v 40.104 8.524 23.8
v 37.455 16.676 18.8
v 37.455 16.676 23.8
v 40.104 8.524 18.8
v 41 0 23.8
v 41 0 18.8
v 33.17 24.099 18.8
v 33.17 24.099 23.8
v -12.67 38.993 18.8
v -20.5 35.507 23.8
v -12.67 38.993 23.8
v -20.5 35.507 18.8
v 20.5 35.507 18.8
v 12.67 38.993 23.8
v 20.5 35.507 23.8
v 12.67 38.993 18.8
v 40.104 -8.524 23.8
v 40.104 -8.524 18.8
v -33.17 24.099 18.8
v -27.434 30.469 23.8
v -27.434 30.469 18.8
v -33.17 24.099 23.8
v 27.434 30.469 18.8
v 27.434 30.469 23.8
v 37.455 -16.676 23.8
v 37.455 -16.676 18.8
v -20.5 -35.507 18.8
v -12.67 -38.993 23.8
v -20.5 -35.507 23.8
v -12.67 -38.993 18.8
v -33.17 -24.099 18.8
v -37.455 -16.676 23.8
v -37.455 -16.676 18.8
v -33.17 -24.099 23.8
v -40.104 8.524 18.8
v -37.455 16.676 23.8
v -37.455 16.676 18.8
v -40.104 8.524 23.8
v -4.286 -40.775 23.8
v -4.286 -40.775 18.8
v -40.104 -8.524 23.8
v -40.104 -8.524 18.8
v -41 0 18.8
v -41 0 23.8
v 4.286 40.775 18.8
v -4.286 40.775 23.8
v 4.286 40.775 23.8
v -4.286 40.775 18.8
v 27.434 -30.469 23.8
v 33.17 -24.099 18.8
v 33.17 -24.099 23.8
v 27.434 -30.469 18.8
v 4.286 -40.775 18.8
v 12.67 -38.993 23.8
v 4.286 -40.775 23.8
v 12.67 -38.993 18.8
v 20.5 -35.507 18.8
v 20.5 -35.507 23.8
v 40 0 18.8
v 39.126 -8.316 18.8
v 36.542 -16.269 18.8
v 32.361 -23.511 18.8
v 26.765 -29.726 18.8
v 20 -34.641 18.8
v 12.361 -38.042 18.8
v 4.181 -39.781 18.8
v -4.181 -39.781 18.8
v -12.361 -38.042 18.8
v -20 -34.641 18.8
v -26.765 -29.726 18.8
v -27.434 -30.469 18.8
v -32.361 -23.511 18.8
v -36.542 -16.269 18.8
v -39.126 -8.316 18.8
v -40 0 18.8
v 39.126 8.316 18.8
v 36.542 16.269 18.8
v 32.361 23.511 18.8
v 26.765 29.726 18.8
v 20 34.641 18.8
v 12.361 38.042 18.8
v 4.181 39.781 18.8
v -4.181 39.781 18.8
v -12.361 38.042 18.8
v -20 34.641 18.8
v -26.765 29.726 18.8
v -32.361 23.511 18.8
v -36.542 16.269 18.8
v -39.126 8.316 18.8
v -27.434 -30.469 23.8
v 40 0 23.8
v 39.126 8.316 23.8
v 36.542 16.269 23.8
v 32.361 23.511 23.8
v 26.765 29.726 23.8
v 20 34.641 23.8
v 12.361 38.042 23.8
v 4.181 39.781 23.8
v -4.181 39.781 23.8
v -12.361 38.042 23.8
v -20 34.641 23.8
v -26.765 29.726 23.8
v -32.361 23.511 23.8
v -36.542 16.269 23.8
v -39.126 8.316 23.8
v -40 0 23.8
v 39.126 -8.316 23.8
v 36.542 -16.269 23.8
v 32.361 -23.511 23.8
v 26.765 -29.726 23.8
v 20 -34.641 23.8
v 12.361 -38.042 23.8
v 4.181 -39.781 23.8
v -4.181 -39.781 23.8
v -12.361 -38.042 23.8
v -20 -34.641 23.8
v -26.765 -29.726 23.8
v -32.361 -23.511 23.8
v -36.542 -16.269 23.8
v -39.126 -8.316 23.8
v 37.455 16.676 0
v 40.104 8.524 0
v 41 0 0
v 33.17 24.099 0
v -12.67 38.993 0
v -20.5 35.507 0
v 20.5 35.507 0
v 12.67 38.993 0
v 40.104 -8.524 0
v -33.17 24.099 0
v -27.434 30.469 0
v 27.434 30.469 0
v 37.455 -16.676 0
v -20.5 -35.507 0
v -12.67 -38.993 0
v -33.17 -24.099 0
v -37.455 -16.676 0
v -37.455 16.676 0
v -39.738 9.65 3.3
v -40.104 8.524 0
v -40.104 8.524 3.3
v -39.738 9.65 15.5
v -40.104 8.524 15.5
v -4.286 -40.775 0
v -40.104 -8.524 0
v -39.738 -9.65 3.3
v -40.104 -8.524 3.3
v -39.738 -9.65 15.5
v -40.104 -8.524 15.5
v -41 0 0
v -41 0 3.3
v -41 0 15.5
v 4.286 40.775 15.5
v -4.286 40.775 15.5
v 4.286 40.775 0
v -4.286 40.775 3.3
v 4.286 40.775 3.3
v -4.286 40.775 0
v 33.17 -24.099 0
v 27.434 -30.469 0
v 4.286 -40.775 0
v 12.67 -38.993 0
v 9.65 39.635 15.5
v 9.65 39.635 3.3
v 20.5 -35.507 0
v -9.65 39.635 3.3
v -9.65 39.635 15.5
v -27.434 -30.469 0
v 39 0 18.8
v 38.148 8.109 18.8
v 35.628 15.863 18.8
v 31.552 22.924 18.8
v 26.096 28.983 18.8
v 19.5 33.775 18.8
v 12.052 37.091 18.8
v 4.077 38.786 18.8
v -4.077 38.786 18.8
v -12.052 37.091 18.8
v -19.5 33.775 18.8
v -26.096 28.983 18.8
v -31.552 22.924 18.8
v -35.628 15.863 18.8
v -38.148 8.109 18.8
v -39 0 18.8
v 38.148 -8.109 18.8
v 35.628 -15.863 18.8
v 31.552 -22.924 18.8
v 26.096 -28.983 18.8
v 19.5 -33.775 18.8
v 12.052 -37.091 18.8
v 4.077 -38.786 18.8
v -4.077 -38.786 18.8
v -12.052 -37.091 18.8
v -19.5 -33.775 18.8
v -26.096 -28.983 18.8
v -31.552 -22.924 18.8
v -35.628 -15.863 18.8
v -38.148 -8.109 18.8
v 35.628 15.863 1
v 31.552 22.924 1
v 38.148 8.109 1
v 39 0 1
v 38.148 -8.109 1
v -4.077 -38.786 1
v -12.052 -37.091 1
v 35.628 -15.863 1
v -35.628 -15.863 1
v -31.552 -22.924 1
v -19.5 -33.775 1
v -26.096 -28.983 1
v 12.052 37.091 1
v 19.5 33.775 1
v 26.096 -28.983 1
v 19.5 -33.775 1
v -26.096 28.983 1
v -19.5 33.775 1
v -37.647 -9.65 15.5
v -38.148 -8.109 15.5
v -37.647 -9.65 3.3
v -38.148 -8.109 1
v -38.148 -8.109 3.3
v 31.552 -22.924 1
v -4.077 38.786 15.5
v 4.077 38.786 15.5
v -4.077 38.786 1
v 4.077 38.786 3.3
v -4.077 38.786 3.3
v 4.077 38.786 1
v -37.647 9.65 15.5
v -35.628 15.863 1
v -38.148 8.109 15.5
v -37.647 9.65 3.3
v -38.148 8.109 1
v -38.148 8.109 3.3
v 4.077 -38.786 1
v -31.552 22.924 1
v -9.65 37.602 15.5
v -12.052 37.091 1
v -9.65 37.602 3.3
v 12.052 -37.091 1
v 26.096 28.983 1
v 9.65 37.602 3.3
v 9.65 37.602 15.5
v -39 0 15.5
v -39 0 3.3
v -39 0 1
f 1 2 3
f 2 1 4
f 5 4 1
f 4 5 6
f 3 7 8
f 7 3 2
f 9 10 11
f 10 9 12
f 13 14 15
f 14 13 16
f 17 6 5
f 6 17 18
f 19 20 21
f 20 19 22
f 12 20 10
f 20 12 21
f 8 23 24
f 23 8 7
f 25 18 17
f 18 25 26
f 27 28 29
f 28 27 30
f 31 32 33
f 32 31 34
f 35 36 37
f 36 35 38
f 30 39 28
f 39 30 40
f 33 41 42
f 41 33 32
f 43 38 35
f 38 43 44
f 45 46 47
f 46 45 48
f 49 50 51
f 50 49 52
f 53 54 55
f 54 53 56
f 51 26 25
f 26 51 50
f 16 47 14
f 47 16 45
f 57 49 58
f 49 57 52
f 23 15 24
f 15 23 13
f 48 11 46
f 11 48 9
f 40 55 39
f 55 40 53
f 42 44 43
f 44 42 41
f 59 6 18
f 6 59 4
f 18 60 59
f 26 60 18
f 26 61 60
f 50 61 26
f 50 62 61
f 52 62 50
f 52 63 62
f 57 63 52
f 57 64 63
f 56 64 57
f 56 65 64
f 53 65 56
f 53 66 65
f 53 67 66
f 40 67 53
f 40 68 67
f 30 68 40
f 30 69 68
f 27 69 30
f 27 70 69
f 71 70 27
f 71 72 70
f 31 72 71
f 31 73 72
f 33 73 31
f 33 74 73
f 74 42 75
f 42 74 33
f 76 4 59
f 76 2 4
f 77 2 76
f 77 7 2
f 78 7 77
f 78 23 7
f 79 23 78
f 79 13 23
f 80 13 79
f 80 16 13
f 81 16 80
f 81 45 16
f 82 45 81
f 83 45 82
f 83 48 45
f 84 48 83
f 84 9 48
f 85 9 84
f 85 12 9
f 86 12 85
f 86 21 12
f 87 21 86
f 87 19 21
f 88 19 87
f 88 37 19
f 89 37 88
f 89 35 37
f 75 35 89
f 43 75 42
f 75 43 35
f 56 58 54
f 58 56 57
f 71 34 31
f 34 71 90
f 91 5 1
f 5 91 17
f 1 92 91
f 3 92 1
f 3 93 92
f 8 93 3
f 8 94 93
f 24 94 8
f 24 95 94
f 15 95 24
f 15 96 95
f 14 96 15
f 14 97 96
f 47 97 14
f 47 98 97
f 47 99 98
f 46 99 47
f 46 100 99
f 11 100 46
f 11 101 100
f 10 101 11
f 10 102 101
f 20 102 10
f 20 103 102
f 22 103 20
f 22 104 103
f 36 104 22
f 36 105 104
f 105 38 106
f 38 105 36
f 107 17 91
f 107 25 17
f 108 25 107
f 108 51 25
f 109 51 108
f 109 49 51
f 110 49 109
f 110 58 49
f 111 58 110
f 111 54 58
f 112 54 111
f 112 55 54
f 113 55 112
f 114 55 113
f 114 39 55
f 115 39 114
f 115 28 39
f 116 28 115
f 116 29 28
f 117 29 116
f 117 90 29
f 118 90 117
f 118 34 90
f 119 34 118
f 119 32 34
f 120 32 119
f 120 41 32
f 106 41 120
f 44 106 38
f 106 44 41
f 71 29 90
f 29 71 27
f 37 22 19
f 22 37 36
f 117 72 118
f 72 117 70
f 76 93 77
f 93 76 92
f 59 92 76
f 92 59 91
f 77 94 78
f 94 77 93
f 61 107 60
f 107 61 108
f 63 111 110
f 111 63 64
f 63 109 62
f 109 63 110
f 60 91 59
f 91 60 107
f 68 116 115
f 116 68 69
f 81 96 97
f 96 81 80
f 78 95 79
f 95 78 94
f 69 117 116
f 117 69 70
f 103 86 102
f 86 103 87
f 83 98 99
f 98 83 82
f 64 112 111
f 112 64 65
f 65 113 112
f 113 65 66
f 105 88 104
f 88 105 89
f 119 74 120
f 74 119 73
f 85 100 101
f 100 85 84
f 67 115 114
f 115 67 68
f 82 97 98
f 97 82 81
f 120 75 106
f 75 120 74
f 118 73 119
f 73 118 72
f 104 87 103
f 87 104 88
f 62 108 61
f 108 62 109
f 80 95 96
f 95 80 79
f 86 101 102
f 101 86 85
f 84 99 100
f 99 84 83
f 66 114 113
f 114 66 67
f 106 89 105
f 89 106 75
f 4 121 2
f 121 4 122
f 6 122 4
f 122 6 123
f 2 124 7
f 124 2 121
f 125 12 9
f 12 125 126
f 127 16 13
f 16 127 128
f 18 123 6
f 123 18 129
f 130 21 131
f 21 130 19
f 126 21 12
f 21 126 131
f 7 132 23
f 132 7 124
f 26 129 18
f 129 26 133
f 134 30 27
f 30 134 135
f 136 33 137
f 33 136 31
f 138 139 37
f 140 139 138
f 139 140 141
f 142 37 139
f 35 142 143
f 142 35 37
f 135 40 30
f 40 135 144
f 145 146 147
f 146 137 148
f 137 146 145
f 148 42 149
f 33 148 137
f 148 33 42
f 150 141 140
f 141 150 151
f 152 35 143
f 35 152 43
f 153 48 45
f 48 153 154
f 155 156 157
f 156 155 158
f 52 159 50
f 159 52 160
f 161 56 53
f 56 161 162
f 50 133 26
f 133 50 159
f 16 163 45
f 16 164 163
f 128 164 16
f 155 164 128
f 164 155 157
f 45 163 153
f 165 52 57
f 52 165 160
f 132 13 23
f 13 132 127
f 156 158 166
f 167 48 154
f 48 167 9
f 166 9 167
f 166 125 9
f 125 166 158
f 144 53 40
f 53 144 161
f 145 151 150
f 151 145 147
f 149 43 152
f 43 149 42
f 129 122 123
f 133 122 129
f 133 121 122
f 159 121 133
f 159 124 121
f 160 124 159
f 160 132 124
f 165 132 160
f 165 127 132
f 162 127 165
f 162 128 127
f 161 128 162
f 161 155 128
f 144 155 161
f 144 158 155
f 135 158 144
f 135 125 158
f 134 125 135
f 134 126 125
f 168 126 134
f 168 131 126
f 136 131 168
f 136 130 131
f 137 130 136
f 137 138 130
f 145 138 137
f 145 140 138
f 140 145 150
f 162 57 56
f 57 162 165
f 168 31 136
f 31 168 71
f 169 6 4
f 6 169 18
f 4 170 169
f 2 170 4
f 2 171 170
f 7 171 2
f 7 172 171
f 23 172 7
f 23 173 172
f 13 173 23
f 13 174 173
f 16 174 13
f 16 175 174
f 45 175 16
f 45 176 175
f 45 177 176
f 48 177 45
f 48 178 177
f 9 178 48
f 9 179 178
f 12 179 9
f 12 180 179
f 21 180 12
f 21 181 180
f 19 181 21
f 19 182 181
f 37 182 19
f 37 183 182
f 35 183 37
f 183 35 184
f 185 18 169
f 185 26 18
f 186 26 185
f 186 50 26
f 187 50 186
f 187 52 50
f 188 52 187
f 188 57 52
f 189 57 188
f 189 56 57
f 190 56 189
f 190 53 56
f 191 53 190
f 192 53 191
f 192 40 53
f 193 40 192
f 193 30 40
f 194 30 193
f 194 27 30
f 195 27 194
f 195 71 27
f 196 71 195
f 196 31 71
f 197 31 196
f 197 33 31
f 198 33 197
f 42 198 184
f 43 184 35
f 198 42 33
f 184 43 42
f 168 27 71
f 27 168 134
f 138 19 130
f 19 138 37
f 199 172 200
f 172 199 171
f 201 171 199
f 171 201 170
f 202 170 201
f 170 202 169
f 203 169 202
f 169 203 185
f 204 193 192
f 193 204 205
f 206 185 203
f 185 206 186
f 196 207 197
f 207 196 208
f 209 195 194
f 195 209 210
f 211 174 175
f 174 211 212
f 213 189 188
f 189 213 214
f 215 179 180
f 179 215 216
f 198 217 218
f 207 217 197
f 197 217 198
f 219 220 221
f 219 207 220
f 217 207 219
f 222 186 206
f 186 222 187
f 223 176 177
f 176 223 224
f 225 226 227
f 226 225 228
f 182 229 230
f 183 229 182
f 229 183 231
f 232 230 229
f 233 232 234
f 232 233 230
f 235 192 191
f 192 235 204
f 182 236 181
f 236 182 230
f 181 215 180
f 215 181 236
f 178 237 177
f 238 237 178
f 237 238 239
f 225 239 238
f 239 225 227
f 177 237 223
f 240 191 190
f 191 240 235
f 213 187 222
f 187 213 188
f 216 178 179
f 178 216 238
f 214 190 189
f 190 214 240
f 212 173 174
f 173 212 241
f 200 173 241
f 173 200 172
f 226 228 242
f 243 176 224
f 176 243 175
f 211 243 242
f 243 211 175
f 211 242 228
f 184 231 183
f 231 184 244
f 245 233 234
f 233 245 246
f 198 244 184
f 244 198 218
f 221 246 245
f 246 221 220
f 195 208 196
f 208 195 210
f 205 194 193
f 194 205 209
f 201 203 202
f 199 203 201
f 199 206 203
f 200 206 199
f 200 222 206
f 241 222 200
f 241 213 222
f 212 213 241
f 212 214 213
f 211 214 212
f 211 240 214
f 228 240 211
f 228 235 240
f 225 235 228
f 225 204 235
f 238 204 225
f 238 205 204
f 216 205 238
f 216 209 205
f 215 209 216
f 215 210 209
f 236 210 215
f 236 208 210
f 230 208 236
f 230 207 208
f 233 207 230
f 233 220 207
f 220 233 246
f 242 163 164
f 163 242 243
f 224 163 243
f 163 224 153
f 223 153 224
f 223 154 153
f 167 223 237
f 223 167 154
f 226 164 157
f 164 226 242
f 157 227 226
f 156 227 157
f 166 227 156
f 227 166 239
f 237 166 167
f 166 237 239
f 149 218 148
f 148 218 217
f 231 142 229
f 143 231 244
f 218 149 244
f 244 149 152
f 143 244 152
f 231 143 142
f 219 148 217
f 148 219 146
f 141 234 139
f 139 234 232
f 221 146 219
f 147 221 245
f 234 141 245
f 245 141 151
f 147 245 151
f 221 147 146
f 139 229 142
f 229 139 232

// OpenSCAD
base = [40, 40, 5];
motor = [12.05, 10, 14.5];
wires = [motor.x, 6, base.z];
t = 1;

wires_out = [1000, wires.y, base.z/2];

module base(){
    difference(){
        union(){
            cylinder(base.z, base.x, base.y);
            translate([0, 0, base.z + motor.z/2])
            difference(){
                cube(motor + [2*t, 2*t, 0], center=true);
                cube(motor, center=true);
            }
        }
        translate([0, 0, wires.z/2])
        cube(wires, center=true);
        translate([0, 0, wires_out.z/2])
        cube(wires_out, center=true);
    }
}

module stick(){
    translate([0, 0, motor.z/2])
    difference(){
        cube(motor + [3*t, 4*t, 0], center=true);
        translate([-t/2, 0, 0])
        cube(motor + [2*t, 2*t, 0], center=true);
    }
    stick_r = 4;
    translate([motor.x/2 + t + stick_r, 0, 0])
    cylinder(75, stick_r, stick_r);
}

switch = [19.3, 50, 11.7 + 0.5];
switch_lip = 2.3;
base_base_z = switch.z + 2*(t + switch_lip);

module base_base(){
    difference(){
        union(){
            translate([0, 0, base_base_z])
            difference(){
                cylinder(base.z, base.x + t, base.y+t);
                cylinder(base.z, base.x, base.y);
            }
            difference(){
                cylinder(base_base_z, base.x + t, base.y + t);
                cylinder(base_base_z, base.x - t, base.y - t);
            }
            cylinder(t, base.x, base.y);
        }
        for (angle = [0, 90]){
            rotate([0, 0, angle])
            translate([0, base.y, switch.z/2 + t + switch_lip])
            cube(switch, center=true);
        }
    }
}

base_base();
//stick();
